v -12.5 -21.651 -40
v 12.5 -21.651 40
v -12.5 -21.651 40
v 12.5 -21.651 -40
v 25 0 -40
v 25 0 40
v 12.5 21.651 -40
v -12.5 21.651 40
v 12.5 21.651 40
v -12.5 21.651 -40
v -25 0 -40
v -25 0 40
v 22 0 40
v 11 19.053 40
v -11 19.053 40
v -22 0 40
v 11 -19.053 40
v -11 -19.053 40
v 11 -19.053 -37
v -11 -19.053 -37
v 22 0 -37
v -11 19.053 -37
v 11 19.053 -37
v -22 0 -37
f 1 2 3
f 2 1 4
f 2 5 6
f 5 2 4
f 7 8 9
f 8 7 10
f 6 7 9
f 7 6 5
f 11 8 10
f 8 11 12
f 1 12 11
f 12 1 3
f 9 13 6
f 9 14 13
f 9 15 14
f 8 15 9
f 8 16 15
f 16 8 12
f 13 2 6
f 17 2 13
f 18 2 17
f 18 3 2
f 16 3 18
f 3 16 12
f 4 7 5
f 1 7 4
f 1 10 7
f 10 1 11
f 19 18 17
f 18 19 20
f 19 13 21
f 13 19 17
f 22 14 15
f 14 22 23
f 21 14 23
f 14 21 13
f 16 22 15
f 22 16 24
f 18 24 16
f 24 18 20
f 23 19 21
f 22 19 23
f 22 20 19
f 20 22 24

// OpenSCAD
//..Parametric Portalápices Poligonal. Test Customizer Thingiverse by www.Bioplastic3d.es


diametro=50;
altura=80;
lados=6;
grosor=3;


difference (){
cylinder(r=diametro/2,h=altura,center=true,$fn=lados);

translate([0,0,grosor])
	cylinder(r=diametro/2-grosor,h=altura,center=true,$fn=lados);
}
